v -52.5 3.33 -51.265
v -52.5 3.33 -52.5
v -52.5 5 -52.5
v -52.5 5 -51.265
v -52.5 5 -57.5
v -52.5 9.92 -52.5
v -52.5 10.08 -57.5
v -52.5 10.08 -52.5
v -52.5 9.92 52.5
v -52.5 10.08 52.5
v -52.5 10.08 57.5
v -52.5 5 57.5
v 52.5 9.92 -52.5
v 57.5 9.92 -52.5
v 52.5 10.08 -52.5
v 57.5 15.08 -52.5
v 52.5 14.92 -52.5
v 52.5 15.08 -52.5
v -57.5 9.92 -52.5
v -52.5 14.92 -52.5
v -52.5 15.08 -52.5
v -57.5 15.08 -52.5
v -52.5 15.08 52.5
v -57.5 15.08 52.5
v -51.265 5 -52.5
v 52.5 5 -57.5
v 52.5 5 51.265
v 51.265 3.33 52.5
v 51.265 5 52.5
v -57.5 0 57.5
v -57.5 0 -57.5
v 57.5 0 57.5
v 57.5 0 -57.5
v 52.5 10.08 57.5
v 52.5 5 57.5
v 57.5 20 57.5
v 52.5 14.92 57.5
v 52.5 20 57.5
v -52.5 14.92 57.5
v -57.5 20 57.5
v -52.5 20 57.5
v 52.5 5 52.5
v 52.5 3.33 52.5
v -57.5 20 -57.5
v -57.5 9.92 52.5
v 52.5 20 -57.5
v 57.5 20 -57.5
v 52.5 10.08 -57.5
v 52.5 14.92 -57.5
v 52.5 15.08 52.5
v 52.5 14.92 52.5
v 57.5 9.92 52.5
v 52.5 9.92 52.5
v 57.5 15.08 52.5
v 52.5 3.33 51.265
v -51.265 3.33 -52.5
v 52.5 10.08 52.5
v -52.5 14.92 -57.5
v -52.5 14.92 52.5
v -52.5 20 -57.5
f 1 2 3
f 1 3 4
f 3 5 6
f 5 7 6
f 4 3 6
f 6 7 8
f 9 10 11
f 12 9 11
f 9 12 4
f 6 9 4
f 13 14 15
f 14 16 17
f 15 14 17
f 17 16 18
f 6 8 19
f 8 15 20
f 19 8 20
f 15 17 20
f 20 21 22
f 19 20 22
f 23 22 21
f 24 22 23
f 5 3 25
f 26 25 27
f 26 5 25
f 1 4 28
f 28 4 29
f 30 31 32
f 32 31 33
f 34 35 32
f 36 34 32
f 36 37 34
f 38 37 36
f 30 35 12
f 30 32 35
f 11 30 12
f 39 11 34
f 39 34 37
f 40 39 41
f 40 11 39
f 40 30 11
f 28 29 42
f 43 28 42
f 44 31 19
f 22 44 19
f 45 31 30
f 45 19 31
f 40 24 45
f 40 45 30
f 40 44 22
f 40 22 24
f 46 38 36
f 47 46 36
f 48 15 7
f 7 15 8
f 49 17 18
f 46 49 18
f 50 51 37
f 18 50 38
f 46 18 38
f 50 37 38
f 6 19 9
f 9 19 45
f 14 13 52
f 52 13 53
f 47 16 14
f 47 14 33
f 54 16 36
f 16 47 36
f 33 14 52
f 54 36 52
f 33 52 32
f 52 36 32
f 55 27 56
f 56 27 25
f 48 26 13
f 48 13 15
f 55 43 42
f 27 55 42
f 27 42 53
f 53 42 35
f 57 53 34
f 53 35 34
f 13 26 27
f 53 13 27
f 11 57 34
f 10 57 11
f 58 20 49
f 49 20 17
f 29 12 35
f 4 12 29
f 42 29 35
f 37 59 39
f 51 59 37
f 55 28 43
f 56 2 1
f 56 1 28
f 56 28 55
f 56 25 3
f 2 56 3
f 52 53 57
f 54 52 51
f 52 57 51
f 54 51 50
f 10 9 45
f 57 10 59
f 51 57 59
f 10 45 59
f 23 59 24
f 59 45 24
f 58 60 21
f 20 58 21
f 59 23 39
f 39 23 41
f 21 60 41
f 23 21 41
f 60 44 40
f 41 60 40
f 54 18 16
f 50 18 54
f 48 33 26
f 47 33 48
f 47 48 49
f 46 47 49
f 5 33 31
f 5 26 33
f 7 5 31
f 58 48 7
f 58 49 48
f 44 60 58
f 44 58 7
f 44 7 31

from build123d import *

# Parameters (mm, degrees)
SKETCH1_W          = 115
SKETCH1_H          = 115
BASE_DEPTH         = 5
SKETCH2_W          = 115
SKETCH2_H          = 15
SKETCH2_W_2        = 105
SKETCH2_H_2        = 5.16
FRAME1_DEPTH       = 5
FRAME2_START       = -5
FRAME2_DEPTH       = 5
FRAME3_START       = -110
SKETCH2_4_W        = 115
SKETCH2_4_H        = 15
SKETCH2_4_W_2      = 105
SKETCH2_4_H_2      = 5.16
FRAME3_DEPTH       = 5
FRAME4_START       = -110
FRAME4_DEPTH       = 5
ANGLED_TRACK_DEPTH = 1.67


with BuildPart() as part:
    # Sketch1 → Base (new body)
    with BuildSketch(Plane(origin=(0, 0, 0), x_dir=(1, 0, 0), z_dir=(0, 1, 0))):
        Rectangle(SKETCH1_W, SKETCH1_H)
    extrude(amount=BASE_DEPTH)

    # Sketch2 → Frame1 (add)
    with BuildSketch(Plane.ZY.offset(57.5)):
        with Locations((0, 12.5)):
            Rectangle(SKETCH2_W, SKETCH2_H)
        with Locations((0, 12.5)):
            Rectangle(SKETCH2_W_2, SKETCH2_H_2, mode=Mode.SUBTRACT)
    extrude(amount=-FRAME1_DEPTH)

    # Sketch4 → Frame2 (add)
    with BuildSketch(Plane(origin=(0, 0, -57.5), x_dir=(-1, 0, 0), z_dir=(0, 0, -1)).offset(FRAME2_START)):
        Polygon((-57.5, 5), (-52.5, 5), (-52.5, 10.08), (52.5, 10.08), (52.5, 5), (57.5, 5), (57.5, 20), (52.5, 20), (52.5, 14.92), (-52.5, 14.92), (-52.5, 20), (-57.5, 20), align=None)
    extrude(amount=FRAME2_DEPTH)

    # Sketch2<4> → Frame3 (add)
    with BuildSketch(Plane.ZY.offset(57.5).offset(FRAME3_START)):
        with Locations((0, 12.5)):
            Rectangle(SKETCH2_4_W, SKETCH2_4_H)
        with Locations((0, 12.5)):
            Rectangle(SKETCH2_4_W_2, SKETCH2_4_H_2, mode=Mode.SUBTRACT)
    extrude(amount=-FRAME3_DEPTH)

    # Sketch4<3> → Frame4 (add)
    with BuildSketch(Plane(origin=(0, 0, -57.5), x_dir=(-1, 0, 0), z_dir=(0, 0, -1)).offset(FRAME4_START)):
        Polygon((-57.5, 5), (-52.5, 5), (-52.5, 10.08), (52.5, 10.08), (52.5, 5), (57.5, 5), (57.5, 20), (52.5, 20), (52.5, 14.92), (-52.5, 14.92), (-52.5, 20), (-57.5, 20), align=None)
    extrude(amount=-FRAME4_DEPTH)

    # Sketch7 → Angled Track (cut)
    with BuildSketch(Plane(origin=(0, 5, 0), x_dir=(1, 0, 0), z_dir=(0, 1, 0))):
        Polygon((52.5, -51.264920156), (-51.264920156, 52.5), (-52.5, 52.5), (-52.5, 51.264920156), (51.264920156, -52.5), (52.5, -52.5), align=None)
    extrude(amount=-ANGLED_TRACK_DEPTH, mode=Mode.SUBTRACT)


solid = part.part
